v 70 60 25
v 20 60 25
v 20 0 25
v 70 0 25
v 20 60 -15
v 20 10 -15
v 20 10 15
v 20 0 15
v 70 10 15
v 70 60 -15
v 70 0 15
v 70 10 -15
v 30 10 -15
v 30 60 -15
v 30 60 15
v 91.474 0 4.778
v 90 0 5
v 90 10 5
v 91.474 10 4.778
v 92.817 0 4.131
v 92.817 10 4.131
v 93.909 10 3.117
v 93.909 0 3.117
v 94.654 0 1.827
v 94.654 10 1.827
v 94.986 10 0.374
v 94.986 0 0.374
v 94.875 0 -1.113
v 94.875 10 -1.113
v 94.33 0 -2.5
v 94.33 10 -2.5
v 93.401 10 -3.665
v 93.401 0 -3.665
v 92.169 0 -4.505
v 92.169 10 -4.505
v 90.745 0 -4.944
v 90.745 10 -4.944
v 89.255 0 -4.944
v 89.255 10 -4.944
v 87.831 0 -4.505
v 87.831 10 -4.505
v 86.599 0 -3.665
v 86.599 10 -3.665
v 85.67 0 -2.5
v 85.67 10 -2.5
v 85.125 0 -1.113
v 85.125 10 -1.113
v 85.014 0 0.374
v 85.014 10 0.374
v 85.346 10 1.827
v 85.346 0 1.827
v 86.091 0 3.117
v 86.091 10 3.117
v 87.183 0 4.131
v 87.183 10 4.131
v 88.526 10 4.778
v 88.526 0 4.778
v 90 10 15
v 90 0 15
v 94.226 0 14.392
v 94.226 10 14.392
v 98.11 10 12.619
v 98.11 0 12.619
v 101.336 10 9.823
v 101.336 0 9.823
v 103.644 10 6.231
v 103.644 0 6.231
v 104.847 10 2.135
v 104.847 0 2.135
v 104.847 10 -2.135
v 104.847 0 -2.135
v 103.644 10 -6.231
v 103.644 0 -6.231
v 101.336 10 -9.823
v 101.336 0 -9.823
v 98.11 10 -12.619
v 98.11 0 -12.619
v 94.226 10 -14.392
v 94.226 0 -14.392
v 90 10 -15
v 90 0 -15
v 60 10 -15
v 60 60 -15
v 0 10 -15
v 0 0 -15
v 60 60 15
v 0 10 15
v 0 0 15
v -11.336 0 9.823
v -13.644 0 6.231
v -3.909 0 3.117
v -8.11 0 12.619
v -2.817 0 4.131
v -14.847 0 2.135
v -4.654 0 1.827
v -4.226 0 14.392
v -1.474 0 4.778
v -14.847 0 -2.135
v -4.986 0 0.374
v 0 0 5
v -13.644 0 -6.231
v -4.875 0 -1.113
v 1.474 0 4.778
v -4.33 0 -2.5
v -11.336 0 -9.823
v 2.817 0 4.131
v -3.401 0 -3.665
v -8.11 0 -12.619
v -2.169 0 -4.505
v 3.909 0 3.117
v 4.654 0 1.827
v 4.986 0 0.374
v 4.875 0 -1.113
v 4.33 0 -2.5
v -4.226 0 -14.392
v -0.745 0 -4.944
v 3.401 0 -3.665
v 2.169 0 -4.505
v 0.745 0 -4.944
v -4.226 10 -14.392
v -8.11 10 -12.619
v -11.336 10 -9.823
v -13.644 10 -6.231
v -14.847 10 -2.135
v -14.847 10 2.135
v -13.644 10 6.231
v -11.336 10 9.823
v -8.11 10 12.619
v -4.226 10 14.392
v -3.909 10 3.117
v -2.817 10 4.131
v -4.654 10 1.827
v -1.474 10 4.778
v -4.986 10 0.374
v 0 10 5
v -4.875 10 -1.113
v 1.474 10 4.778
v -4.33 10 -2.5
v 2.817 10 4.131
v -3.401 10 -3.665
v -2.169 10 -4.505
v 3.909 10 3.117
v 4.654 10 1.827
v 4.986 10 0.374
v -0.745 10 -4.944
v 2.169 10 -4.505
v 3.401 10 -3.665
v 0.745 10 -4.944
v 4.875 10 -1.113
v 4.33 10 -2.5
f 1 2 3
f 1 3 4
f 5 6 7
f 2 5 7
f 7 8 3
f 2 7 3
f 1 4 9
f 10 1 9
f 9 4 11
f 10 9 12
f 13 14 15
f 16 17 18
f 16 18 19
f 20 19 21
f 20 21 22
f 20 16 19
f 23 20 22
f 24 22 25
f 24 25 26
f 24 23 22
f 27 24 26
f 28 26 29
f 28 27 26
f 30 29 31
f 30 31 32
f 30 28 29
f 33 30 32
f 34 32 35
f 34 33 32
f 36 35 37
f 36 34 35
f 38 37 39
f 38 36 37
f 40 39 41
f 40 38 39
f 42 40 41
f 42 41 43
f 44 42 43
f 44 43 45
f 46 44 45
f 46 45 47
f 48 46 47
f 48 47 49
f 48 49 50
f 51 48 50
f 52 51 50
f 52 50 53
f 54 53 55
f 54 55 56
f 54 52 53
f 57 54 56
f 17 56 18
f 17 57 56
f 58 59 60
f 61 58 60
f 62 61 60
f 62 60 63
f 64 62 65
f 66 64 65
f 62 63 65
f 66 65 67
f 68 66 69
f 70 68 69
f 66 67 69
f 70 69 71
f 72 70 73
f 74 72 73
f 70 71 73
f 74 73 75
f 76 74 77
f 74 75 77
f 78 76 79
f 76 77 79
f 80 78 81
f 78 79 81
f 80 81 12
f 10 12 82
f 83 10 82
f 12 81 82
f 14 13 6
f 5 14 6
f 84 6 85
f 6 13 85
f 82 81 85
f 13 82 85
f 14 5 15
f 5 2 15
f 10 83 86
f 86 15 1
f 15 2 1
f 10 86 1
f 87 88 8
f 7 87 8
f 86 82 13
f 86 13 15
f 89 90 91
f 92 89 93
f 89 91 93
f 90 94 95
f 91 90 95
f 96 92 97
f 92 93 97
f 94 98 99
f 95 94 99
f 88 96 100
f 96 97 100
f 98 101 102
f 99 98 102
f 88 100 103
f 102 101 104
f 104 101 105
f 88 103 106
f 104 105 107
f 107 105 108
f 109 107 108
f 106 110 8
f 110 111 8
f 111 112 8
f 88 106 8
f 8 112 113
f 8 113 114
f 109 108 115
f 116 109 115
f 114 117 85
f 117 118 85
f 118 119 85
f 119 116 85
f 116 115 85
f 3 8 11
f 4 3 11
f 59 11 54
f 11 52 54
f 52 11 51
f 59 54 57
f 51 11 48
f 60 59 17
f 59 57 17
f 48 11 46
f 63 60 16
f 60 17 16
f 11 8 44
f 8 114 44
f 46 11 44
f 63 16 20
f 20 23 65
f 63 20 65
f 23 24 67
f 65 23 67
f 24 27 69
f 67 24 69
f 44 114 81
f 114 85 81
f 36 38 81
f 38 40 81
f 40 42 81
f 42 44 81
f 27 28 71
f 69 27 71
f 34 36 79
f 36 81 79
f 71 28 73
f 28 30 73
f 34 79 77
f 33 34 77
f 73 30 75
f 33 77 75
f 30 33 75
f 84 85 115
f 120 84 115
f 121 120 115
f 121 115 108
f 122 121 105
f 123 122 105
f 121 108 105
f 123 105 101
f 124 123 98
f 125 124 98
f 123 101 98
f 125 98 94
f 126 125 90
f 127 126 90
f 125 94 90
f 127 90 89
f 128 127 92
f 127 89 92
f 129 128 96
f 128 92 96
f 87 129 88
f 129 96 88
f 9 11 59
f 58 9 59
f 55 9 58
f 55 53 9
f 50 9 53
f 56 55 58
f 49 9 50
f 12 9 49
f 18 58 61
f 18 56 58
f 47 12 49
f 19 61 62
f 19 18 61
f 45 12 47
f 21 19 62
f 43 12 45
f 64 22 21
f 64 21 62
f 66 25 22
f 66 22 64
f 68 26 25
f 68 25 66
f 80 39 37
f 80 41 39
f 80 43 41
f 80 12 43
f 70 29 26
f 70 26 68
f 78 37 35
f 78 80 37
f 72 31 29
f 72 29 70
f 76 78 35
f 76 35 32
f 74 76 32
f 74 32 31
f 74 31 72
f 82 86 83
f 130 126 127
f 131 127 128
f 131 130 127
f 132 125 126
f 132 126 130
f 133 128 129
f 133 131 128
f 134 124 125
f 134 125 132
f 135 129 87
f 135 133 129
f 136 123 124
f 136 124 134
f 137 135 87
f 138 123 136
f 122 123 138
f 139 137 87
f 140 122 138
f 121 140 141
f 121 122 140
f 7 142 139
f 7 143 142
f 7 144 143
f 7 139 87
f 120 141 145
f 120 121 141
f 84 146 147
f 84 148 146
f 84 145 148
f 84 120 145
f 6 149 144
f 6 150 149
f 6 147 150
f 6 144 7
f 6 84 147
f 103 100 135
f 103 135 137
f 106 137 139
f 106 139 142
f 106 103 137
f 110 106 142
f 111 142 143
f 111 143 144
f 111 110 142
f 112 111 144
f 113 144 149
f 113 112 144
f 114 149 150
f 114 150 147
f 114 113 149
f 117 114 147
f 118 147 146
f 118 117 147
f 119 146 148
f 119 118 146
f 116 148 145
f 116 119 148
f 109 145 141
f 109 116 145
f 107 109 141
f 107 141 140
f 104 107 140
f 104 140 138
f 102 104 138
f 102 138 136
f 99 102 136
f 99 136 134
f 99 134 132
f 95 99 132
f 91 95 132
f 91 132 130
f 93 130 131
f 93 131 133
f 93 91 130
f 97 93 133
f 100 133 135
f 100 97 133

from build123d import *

# Parameters (mm, degrees)
SKETCH1_R           = 5
BOSS_EXTRUDE4_DEPTH = 10
BOSS_EXTRUDE6_DEPTH = 60
BOSS_EXTRUDE7_DEPTH = 30


with BuildPart() as part:
    # Sketch1 → Boss-Extrude4 (new body)
    with BuildSketch(Plane(origin=(0, 0, 0), x_dir=(1, 0, 0), z_dir=(0, 1, 0))):
        with BuildLine():
            Line((0, -15), (20, -15))
            Line((20, -15), (20, -25))
            Line((20, -25), (70, -25))
            Line((70, -25), (70, -15))
            Line((70, -15), (90, -15))
            ThreePointArc((90, -15), (105, 0), (90, 15))
            Line((90, 15), (0, 15))
            ThreePointArc((0, 15), (-15, 0), (0, -15))
        make_face()
        with Locations(Location((0, 0, 0), (0, 0, 270))):
            Circle(SKETCH1_R, mode=Mode.SUBTRACT)
        with Locations(Location((90, 0, 0), (0, 0, 270))):
            Circle(SKETCH1_R, mode=Mode.SUBTRACT)
    extrude(amount=BOSS_EXTRUDE4_DEPTH)

    # Sketch4 → Boss-Extrude6 (add)
    with BuildSketch(Plane.XZ):
        Polygon((20, -15), (30, -15), (30, 15), (60, 15), (60, -15), (70, -15), (70, 25), (20, 25), align=None)
    extrude(amount=-BOSS_EXTRUDE6_DEPTH)

    # Sketch5 → Boss-Extrude7 (add)
    with BuildSketch(Plane.ZY.offset(-60)):
        Polygon((-15, 10), (15, 60), (15, 10), align=None)
    extrude(amount=BOSS_EXTRUDE7_DEPTH)


solid = part.part
